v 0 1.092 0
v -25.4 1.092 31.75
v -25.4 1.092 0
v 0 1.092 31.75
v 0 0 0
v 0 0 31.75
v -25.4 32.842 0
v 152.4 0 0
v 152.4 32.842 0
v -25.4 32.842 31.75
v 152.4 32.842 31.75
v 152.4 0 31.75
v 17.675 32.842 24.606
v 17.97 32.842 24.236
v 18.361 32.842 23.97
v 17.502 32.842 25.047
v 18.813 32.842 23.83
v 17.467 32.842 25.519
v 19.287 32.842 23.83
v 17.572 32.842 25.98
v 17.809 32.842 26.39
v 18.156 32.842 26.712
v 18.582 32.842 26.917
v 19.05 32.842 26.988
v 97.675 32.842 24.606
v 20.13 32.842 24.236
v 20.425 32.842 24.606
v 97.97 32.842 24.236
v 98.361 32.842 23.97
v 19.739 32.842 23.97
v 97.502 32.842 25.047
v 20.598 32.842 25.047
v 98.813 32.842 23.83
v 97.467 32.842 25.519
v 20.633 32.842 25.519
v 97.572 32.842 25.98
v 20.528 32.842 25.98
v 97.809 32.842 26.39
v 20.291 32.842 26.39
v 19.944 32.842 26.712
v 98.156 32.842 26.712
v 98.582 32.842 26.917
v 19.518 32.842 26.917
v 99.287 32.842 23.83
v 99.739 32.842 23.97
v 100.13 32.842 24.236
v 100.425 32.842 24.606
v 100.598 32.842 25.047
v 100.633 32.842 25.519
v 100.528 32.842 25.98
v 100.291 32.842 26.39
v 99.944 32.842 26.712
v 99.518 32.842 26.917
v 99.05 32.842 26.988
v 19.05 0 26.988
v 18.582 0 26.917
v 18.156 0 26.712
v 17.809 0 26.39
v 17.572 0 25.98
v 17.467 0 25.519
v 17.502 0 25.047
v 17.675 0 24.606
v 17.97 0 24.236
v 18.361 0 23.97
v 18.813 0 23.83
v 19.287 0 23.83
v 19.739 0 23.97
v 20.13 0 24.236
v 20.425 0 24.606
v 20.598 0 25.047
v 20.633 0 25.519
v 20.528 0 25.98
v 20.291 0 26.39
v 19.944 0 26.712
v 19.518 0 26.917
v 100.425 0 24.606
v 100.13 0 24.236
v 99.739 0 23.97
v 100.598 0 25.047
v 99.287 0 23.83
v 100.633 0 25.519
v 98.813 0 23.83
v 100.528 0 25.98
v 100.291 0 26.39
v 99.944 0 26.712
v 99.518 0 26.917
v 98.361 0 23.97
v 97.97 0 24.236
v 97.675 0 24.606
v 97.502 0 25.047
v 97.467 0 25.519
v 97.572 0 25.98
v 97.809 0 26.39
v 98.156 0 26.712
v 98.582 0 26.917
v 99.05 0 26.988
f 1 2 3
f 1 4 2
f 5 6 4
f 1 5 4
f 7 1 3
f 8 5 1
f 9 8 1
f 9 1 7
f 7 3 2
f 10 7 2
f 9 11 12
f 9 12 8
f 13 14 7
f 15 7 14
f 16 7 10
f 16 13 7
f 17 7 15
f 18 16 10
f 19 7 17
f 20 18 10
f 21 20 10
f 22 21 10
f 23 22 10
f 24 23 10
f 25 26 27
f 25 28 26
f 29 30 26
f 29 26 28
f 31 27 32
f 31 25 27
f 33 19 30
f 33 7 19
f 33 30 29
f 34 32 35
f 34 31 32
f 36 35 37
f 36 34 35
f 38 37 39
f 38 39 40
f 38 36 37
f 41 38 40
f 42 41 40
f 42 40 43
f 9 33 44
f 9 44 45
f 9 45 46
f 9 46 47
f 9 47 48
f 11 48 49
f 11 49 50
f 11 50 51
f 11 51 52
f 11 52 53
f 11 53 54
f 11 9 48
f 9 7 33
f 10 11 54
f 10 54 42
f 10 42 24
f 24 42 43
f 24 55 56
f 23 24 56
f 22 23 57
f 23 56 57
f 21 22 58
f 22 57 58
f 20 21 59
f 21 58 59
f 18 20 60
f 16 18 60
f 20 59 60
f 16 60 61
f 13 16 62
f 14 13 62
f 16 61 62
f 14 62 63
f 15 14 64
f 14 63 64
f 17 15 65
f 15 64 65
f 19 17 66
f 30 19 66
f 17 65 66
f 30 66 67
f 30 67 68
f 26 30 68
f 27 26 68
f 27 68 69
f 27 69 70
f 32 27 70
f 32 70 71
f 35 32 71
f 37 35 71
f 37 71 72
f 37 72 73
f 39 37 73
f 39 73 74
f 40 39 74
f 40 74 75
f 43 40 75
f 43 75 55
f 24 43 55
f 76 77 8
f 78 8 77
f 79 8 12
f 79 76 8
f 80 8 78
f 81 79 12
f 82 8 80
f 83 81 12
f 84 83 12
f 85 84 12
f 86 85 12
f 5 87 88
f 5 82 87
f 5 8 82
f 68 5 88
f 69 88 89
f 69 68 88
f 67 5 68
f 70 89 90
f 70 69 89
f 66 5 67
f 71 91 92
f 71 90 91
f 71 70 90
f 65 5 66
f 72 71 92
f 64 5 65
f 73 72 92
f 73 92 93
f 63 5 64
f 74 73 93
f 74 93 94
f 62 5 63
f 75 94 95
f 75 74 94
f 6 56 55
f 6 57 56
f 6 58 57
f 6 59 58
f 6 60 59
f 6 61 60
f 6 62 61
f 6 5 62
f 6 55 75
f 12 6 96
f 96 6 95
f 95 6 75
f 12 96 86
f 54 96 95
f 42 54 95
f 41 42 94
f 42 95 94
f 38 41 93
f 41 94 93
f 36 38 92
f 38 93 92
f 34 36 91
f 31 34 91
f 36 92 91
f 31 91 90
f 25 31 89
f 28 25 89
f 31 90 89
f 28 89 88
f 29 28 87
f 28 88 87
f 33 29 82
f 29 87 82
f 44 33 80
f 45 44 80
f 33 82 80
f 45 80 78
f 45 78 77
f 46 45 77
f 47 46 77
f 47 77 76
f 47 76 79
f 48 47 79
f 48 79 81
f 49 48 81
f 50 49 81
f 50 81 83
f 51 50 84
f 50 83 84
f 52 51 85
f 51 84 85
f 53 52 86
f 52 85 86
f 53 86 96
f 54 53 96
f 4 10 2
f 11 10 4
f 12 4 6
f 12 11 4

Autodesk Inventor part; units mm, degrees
ref_plane "YZ Plane" through (0, 0, 0) normal (1, 0, 0) x (0, 1, 0)
ref_plane "XZ Plane" through (0, 0, 0) normal (0, 1, 0) x (-1, 0, 0)
ref_plane "XY Plane" through (0, 0, 0) normal (0, 0, 1) x (1, 0, 0)
sketch "Sketch1" plane through (0, 0, 0) normal (1, 0, 0) x (0, 1, 0)
  line L0 (0, 0) -> (32.8422, 0)
  line L1 (32.8422, 0) -> (32.8422, 31.75)
  line L2 (32.8422, 31.75) -> (0, 31.75)
  line L3 (0, 31.75) -> (0, 0)
  dimension "d0" = 32.8422
  dimension "d1" = 31.75
extrude "Extrusion1" add sketch "Sketch1" along normal blind 127
sketch "Sketch2" plane through (0, 32.8422, 31.75) normal (0, 1, 0) x (1, 0, 0)
  line L0 (0, 0) -> (127, 0) projected
  line L1 (0, 31.75) -> (0, 0) projected
  point P0 (19.05, 6.35)
  point P1 (99.05, 6.35)
  dimension "d4" = 0
  dimension "d5" = 6.35
  dimension "d6" = 80
  dimension "d7" = 19.05
hole "Hole1" at (19.05, 32.8422, 25.4) at (99.05, 32.8422, 25.4) direction (0, -1, 0) diameter 3.175 end through all
sketch "Sketch3" plane through (127, 0, 0) normal (1, 0, 0) x (0, 0, -1)
  line L0 (-31.75, 32.8422) -> (0, 32.8422)
  line L1 (0, 32.8422) -> (0, 0)
  line L2 (0, 0) -> (-31.75, 0)
  line L3 (-31.75, 0) -> (-31.75, 32.8422)
  line L4 (0, 32.8422) -> (-31.75, 32.8422) projected
  line L5 (-31.75, 32.8422) -> (-31.75, 0) projected
  dimension "d15" = 0
  dimension "d16" = 0
extrude "Extrusion2" add sketch "Sketch3" along normal blind 25.4
sketch "Sketch4" plane through (0, 0, 0) normal (-1, 0, 0) x (0, 0, 1)
  line L0 (0, 32.8422) -> (31.75, 32.8422) projected
  line L1 (0, 32.8422) -> (31.75, 32.8422)
  line L2 (31.75, 32.8422) -> (31.75, 1.0922)
  line L3 (31.75, 1.0922) -> (0, 1.0922)
  line L4 (0, 1.0922) -> (0, 32.8422)
  point P0 (0, 0)
extrude "Extrusion3" add sketch "Sketch4" along normal blind 25.4
properties part number "StandoffBlocks"
